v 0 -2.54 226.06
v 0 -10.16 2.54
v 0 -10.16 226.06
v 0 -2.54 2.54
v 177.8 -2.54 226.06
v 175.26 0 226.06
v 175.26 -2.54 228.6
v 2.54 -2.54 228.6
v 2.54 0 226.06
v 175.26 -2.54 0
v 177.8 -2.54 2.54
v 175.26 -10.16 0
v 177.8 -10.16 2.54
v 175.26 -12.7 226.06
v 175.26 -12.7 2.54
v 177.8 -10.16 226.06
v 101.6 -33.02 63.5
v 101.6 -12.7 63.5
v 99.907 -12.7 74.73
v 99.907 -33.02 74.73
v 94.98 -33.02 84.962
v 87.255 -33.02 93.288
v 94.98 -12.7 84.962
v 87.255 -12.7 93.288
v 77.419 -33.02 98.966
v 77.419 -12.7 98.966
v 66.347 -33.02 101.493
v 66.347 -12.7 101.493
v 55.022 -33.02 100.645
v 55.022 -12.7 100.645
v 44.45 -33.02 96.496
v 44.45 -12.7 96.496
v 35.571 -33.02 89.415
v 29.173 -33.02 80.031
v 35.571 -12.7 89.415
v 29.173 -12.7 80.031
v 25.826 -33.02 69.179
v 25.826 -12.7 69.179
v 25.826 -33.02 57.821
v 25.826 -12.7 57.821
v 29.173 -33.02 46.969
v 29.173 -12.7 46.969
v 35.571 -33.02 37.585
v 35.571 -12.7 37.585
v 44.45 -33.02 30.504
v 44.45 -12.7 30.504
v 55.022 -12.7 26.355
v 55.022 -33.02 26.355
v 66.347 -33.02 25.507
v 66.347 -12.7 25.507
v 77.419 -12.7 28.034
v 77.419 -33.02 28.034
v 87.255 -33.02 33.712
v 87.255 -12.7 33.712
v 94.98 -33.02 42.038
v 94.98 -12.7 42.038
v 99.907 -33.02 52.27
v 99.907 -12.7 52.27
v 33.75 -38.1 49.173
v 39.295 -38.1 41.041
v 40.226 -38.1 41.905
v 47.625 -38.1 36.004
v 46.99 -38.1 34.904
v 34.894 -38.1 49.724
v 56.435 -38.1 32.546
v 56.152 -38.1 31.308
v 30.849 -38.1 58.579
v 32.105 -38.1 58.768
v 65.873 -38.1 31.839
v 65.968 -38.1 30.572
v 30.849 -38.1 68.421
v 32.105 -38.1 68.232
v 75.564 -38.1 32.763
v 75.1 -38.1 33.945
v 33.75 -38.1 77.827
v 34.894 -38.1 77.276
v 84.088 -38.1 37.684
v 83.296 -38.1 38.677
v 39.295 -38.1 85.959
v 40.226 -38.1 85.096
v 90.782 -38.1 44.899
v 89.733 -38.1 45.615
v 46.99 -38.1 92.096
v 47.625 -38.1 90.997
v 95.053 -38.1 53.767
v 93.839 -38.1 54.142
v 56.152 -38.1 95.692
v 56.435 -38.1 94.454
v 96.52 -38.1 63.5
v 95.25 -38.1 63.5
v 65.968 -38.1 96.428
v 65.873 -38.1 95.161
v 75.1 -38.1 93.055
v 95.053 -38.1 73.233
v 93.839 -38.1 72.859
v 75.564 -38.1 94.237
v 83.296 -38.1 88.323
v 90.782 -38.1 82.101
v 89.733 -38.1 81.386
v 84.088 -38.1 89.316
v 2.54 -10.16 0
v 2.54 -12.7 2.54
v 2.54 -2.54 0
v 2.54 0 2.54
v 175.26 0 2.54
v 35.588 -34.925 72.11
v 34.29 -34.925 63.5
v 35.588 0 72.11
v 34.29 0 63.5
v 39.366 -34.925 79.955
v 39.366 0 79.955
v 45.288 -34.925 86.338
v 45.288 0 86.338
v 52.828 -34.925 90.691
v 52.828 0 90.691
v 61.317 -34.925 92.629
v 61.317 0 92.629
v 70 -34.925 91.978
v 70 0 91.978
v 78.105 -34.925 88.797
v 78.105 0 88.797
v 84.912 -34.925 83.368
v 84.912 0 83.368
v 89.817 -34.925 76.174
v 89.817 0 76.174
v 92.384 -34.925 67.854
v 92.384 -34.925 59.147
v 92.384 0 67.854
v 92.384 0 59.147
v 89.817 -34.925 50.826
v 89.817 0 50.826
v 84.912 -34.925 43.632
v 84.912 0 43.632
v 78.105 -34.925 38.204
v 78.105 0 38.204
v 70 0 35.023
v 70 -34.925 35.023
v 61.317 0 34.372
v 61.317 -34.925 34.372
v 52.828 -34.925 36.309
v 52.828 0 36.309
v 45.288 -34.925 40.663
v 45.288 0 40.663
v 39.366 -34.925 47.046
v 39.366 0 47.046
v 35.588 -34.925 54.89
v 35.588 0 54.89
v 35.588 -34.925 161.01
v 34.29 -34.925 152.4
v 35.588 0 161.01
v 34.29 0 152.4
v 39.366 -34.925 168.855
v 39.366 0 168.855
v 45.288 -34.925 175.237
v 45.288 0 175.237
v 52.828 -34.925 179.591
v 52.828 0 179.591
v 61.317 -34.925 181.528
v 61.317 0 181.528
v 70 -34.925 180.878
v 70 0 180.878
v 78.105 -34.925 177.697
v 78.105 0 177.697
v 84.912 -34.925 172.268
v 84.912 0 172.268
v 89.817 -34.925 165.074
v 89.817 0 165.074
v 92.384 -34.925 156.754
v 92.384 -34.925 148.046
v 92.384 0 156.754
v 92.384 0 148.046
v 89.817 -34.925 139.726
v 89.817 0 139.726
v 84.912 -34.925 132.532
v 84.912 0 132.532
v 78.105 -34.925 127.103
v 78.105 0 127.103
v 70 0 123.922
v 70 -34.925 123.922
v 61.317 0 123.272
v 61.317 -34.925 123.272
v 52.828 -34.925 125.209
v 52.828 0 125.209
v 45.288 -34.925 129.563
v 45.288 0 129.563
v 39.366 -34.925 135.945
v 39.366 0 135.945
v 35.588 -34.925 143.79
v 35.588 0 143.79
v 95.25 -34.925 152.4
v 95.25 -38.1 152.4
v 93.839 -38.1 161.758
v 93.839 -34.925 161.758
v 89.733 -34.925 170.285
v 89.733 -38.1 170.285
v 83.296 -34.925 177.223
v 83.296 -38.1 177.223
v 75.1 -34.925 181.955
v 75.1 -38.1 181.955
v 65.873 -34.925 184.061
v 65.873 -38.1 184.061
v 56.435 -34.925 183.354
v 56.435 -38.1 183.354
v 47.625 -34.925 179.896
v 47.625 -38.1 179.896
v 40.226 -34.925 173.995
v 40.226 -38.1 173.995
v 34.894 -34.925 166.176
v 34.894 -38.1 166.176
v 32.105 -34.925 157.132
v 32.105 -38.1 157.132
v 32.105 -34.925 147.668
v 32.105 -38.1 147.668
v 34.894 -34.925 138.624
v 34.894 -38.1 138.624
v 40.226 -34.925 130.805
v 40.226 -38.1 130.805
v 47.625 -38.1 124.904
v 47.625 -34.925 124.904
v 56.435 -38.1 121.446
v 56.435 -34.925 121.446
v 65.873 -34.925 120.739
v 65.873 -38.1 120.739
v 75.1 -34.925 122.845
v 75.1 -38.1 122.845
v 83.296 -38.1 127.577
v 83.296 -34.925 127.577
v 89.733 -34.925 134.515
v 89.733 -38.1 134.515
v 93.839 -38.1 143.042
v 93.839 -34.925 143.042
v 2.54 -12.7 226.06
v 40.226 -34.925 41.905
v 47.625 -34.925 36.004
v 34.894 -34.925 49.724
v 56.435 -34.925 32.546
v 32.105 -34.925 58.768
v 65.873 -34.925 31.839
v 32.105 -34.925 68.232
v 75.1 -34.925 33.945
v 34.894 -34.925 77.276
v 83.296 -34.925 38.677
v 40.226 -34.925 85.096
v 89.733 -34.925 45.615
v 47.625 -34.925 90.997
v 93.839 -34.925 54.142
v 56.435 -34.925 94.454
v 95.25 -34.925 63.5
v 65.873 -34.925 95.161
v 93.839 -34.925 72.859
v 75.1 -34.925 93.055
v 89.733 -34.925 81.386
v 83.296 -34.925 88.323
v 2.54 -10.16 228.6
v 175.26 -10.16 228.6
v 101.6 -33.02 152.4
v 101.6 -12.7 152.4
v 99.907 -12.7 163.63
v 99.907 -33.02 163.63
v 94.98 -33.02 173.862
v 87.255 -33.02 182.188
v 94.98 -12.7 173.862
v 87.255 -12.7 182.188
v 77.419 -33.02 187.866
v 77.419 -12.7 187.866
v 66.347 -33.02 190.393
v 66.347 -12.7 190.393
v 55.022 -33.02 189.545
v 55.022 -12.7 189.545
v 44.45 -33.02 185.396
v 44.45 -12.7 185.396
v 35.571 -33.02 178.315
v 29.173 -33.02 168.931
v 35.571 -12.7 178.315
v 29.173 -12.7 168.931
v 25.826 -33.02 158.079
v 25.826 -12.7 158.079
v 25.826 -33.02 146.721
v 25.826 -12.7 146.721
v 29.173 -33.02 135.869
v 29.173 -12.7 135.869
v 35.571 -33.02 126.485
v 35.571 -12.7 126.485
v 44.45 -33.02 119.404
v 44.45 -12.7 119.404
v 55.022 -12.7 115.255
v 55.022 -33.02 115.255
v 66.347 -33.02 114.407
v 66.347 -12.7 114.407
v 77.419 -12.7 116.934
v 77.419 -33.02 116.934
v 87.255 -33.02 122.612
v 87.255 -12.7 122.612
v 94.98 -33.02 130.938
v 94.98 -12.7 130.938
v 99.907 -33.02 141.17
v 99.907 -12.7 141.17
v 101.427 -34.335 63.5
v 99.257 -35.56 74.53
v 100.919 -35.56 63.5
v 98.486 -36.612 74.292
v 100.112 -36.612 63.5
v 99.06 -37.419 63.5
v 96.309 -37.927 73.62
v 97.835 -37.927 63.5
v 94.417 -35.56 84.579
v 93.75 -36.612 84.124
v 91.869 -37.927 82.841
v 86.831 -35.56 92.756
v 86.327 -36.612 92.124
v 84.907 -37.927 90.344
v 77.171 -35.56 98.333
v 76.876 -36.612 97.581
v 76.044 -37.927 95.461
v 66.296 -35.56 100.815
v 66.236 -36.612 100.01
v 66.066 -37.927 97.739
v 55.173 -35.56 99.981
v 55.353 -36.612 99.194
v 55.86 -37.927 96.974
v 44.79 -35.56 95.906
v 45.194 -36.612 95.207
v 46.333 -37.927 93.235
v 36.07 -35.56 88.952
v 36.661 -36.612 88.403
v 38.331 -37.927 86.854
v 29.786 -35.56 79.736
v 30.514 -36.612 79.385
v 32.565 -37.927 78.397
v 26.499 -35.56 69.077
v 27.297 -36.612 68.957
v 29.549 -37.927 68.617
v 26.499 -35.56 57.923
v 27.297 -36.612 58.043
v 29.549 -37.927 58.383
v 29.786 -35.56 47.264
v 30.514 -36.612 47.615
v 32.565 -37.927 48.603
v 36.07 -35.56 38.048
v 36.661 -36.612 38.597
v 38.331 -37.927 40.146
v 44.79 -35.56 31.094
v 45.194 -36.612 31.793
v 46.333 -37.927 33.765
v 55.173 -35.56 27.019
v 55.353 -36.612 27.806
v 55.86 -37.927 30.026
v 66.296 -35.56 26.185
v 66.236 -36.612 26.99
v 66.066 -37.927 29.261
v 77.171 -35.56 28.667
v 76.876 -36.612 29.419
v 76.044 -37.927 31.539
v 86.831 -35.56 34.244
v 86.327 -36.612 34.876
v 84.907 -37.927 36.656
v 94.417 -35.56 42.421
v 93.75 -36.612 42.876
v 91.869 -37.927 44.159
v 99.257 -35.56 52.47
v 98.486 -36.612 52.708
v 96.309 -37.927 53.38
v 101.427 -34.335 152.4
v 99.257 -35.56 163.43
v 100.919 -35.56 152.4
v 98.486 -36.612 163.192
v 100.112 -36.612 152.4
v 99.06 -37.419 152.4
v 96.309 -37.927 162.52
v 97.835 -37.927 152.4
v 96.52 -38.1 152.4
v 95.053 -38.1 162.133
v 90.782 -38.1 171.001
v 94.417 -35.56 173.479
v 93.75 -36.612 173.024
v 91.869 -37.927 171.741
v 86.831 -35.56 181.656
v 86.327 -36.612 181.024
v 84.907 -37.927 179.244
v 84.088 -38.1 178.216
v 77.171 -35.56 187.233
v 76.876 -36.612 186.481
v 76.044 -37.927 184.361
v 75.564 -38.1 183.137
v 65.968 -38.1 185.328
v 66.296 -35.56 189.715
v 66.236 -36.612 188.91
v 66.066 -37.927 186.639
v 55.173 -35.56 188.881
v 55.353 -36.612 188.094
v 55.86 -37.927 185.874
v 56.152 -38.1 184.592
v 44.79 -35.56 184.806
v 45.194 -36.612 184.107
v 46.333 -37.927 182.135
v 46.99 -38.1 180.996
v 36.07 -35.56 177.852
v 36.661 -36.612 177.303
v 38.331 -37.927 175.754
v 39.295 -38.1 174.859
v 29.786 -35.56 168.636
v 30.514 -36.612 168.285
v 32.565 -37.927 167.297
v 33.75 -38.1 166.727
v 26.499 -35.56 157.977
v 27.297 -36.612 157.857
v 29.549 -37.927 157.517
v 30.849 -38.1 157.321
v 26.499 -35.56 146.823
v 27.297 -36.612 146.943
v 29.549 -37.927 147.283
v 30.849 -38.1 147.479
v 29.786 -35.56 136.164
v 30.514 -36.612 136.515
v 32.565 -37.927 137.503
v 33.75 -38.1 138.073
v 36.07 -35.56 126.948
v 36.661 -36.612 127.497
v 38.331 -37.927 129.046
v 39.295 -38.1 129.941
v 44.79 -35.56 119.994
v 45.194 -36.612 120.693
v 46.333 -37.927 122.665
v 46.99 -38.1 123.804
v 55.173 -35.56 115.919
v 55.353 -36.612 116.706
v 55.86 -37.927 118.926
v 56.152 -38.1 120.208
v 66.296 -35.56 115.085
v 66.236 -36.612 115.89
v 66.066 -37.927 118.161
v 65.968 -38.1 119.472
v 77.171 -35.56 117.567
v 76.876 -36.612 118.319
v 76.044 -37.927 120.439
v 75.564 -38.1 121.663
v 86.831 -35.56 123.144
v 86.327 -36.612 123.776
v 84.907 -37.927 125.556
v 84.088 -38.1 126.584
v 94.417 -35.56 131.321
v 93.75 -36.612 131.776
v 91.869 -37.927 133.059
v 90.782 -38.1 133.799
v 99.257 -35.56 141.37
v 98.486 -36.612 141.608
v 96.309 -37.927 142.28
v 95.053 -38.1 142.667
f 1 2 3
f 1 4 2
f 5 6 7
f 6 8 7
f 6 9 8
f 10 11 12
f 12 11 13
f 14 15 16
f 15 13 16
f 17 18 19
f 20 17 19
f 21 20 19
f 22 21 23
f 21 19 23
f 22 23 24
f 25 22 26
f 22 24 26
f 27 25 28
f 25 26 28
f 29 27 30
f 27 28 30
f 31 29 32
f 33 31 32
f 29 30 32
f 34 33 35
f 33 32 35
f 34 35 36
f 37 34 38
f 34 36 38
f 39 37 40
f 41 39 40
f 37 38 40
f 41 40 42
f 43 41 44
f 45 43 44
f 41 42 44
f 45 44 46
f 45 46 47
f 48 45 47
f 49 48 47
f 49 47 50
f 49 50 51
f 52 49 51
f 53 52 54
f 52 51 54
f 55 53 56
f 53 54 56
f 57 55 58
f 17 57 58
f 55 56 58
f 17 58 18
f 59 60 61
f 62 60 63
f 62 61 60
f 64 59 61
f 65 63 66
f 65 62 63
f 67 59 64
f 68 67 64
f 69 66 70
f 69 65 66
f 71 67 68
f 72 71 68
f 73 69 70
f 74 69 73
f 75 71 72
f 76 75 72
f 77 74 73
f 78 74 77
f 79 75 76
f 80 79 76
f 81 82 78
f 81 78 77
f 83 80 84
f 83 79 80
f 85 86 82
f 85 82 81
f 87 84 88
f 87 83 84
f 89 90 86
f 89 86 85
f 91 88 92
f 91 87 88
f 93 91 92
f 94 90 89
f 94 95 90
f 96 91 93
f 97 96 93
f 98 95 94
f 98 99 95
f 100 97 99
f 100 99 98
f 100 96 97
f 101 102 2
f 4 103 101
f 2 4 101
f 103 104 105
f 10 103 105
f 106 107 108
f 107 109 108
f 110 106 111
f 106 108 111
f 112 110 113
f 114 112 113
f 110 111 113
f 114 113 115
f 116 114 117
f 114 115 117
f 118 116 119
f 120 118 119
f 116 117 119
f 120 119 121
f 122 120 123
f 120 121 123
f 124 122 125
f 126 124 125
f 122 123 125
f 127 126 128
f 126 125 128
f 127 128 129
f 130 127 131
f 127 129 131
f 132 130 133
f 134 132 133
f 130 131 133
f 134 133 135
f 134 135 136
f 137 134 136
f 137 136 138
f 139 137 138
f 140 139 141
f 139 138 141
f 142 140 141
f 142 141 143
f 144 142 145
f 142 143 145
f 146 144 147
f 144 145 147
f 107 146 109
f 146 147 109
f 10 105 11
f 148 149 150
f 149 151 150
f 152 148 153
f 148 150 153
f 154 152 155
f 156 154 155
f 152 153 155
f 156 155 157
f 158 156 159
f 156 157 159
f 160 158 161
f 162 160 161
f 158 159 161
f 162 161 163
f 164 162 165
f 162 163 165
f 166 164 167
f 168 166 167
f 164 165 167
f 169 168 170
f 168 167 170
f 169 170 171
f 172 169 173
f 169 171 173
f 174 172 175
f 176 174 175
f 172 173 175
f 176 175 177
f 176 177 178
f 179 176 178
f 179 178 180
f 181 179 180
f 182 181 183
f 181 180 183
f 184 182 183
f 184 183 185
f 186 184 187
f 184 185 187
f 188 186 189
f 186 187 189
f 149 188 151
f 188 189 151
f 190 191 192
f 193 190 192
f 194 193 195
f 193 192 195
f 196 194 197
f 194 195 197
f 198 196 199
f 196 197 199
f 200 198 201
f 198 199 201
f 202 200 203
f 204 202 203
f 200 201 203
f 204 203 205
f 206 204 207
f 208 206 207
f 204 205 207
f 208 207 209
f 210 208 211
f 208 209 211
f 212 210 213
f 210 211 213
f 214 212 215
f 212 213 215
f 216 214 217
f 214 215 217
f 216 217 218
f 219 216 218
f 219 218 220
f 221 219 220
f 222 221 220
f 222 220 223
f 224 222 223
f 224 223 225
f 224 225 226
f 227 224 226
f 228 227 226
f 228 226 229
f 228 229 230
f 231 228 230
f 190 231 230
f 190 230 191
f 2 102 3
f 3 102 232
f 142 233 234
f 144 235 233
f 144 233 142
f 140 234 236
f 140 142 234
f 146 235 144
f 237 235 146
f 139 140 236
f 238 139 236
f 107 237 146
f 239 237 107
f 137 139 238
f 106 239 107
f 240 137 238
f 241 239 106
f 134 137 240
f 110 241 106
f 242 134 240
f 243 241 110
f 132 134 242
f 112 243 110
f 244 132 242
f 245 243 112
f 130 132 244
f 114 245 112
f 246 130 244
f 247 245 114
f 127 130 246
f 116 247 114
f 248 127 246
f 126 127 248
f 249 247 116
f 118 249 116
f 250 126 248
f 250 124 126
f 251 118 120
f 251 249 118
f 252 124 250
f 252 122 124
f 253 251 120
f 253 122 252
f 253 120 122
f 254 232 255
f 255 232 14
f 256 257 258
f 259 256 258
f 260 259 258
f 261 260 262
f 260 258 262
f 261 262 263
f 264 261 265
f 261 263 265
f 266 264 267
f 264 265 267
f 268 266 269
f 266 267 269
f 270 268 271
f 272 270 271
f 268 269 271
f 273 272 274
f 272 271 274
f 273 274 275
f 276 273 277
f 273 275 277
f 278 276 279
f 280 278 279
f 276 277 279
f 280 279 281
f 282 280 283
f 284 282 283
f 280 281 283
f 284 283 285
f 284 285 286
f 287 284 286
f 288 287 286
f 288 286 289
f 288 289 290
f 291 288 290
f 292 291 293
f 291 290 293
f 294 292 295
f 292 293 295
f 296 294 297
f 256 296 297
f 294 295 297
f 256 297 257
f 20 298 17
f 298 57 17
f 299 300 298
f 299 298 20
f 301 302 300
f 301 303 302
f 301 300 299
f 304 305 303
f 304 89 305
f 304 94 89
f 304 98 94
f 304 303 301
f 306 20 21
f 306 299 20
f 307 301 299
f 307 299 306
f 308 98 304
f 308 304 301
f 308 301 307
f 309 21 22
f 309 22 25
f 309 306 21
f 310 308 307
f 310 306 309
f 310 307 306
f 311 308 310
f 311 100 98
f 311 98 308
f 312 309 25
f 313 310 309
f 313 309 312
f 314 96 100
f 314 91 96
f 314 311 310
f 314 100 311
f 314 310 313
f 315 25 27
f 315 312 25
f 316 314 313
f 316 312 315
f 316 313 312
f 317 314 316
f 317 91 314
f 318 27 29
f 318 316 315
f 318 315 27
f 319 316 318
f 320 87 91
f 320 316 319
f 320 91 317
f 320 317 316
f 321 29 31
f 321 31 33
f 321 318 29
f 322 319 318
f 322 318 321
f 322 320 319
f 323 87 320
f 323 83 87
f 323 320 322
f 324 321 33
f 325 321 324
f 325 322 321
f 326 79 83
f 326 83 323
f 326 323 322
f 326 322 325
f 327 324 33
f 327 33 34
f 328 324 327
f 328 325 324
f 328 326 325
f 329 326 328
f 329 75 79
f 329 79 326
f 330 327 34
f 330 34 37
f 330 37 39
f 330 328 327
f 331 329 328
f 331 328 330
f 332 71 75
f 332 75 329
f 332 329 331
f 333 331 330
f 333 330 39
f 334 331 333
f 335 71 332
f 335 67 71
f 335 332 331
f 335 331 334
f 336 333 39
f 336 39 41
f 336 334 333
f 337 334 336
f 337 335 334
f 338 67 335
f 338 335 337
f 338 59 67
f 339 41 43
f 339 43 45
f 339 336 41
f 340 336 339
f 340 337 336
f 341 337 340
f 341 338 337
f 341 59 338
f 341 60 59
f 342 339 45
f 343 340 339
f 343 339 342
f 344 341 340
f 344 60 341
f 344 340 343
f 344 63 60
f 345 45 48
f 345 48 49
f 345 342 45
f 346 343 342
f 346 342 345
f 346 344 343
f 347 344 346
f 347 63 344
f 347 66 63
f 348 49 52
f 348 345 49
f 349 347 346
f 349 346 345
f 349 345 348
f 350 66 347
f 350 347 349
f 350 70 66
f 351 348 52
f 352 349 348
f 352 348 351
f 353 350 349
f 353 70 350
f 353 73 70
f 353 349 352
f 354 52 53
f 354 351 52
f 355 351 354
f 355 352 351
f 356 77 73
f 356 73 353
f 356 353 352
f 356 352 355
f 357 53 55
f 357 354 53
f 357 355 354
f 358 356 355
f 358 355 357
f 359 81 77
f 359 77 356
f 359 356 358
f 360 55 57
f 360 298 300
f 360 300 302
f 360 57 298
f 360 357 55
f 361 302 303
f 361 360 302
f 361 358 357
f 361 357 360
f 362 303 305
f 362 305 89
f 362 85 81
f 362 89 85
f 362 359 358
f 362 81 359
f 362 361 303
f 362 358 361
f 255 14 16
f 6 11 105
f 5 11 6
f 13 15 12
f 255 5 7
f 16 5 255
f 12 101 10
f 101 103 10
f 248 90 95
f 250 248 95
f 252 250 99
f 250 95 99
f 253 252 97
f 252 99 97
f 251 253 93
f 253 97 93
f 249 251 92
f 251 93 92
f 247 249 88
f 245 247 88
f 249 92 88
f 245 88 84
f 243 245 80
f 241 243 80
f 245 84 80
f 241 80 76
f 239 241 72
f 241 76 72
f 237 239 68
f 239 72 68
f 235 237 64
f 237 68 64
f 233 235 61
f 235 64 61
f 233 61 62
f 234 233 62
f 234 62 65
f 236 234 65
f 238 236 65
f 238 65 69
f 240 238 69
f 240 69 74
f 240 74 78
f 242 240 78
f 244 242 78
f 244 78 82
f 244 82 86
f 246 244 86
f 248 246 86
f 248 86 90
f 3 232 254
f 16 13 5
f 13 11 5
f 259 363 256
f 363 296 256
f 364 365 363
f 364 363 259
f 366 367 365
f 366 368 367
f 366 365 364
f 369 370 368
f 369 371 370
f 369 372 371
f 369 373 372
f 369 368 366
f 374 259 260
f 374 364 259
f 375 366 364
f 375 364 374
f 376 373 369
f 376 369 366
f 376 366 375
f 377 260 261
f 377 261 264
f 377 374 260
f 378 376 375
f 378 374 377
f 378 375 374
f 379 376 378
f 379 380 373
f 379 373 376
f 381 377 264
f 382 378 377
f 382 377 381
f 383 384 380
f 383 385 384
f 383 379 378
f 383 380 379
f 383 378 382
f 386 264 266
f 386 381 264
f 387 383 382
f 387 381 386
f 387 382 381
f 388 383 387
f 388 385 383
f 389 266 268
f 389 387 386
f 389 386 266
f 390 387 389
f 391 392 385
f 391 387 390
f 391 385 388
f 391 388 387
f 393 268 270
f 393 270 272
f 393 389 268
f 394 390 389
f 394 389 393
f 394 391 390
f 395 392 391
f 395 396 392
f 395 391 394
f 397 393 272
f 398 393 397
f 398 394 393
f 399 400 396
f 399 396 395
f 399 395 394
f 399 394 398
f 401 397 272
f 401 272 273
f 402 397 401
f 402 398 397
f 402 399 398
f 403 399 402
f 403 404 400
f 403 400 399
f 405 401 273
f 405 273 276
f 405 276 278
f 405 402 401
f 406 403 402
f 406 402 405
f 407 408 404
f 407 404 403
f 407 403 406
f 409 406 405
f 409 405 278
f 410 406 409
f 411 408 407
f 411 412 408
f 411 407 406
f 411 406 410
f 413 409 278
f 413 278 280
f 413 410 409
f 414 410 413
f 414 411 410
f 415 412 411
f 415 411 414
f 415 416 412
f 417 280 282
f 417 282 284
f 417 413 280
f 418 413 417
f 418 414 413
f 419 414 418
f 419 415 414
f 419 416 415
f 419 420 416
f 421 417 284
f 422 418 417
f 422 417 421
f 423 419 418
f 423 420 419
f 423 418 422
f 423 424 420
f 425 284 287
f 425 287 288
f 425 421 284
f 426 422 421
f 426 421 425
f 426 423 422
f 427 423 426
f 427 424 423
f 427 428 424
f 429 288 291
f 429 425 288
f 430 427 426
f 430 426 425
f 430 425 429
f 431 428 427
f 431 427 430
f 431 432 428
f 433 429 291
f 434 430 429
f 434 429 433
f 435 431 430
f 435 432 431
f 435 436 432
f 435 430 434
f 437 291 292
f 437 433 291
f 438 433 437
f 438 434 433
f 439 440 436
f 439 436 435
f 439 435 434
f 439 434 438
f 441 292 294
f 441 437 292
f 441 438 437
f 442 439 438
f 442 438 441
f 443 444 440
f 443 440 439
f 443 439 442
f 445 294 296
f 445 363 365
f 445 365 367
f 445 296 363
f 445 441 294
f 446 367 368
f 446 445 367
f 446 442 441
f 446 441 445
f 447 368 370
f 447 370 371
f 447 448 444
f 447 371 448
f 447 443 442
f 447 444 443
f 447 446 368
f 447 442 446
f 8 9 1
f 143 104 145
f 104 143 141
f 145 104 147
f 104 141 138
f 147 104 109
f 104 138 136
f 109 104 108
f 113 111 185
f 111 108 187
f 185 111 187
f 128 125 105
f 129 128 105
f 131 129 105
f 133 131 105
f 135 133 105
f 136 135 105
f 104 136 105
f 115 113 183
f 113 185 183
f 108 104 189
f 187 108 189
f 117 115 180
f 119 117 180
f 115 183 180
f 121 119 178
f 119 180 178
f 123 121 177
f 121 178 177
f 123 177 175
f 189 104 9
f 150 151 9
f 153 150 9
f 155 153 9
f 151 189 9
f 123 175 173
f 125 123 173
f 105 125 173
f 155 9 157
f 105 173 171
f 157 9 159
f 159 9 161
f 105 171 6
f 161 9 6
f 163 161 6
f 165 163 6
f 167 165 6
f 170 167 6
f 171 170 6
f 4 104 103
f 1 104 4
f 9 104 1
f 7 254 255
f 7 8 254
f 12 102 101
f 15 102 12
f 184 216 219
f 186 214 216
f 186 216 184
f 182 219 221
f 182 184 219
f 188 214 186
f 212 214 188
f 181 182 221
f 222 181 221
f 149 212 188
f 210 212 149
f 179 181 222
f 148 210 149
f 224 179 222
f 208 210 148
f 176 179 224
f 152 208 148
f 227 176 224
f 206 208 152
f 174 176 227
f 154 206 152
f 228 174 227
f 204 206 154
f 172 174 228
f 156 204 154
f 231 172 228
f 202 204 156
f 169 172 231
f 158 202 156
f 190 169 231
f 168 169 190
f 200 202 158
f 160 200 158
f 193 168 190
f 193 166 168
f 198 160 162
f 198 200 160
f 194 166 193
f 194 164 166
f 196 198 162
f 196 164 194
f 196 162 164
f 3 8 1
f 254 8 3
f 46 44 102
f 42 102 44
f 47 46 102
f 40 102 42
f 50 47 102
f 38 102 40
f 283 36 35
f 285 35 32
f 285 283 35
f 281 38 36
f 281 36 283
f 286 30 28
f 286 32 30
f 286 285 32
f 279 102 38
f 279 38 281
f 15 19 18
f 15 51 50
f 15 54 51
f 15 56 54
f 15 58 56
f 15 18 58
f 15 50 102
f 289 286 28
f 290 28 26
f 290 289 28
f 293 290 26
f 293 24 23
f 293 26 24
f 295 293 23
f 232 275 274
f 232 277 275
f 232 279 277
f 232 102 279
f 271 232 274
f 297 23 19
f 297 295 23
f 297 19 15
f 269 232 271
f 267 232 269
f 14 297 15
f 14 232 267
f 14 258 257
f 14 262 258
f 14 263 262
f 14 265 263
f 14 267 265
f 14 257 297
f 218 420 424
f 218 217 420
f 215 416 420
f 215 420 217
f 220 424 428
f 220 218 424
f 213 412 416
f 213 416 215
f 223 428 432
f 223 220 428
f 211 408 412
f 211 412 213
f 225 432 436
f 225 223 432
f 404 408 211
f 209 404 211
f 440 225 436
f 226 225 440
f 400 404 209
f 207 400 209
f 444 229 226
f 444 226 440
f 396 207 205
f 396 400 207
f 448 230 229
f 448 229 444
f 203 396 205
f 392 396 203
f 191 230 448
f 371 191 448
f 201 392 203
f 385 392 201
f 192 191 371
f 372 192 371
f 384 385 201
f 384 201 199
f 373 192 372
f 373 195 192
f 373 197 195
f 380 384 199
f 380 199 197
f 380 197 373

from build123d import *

# Parameters (mm, degrees)
F0_W           = 177.8
F0_H           = 228.6
F1_DEPTH       = 12.7
F2_R           = 38.1
F3_DEPTH       = 25.4
F4_SIZE        = 2.54
F5_R           = 5.08
F7_D           = 58.42
F7_CBORE_D     = 63.5
F7_CBORE_DEPTH = 3.175


with BuildPart() as f1:
    # F0 (on Front) → F1 (new body)
    with BuildSketch(Plane.XZ):
        with Locations((88.9, 114.3)):
            Rectangle(F0_W, F0_H)
    extrude(amount=F1_DEPTH)

    # F2 (on face) → F3 (join)
    with BuildSketch(Plane.XZ.offset(12.7)):
        with Locations((63.5, 152.4)):
            Circle(F2_R)
        with Locations((63.5, 63.5)):
            Circle(F2_R)
    extrude(amount=F3_DEPTH)

    # F4
    f4_edges = [f1.edges().sort_by_distance(p)[0] for p in [
        (177.8, -12.7, 114.3),
        (177.8, 0, 114.3),
        (88.9, -12.7, 228.6),
        (88.9, 0, 228.6),
        (0, -12.7, 114.3),
        (0, 0, 114.3),
        (88.9, -12.7, 0),
        (88.9, 0, 0),
        (0, -6.35, 0),
        (177.8, -6.35, 0),
        (0, -6.35, 228.6),
        (177.8, -6.35, 228.6),
    ]]
    chamfer(f4_edges, length=F4_SIZE)

    # F5
    f5_edges = [f1.edges().sort_by_distance(p)[0] for p in [
        (25.4, -38.1, 63.5),
        (25.4, -38.1, 152.4),
    ]]
    fillet(f5_edges, radius=F5_R)

    # F7 (through all)
    with Locations(Plane.XZ.offset(38.1)):
        with Locations((63.5, 152.4), (63.5, 63.500218)):
            CounterBoreHole(F7_D / 2, F7_CBORE_D / 2, F7_CBORE_DEPTH)


solid = f1.part
